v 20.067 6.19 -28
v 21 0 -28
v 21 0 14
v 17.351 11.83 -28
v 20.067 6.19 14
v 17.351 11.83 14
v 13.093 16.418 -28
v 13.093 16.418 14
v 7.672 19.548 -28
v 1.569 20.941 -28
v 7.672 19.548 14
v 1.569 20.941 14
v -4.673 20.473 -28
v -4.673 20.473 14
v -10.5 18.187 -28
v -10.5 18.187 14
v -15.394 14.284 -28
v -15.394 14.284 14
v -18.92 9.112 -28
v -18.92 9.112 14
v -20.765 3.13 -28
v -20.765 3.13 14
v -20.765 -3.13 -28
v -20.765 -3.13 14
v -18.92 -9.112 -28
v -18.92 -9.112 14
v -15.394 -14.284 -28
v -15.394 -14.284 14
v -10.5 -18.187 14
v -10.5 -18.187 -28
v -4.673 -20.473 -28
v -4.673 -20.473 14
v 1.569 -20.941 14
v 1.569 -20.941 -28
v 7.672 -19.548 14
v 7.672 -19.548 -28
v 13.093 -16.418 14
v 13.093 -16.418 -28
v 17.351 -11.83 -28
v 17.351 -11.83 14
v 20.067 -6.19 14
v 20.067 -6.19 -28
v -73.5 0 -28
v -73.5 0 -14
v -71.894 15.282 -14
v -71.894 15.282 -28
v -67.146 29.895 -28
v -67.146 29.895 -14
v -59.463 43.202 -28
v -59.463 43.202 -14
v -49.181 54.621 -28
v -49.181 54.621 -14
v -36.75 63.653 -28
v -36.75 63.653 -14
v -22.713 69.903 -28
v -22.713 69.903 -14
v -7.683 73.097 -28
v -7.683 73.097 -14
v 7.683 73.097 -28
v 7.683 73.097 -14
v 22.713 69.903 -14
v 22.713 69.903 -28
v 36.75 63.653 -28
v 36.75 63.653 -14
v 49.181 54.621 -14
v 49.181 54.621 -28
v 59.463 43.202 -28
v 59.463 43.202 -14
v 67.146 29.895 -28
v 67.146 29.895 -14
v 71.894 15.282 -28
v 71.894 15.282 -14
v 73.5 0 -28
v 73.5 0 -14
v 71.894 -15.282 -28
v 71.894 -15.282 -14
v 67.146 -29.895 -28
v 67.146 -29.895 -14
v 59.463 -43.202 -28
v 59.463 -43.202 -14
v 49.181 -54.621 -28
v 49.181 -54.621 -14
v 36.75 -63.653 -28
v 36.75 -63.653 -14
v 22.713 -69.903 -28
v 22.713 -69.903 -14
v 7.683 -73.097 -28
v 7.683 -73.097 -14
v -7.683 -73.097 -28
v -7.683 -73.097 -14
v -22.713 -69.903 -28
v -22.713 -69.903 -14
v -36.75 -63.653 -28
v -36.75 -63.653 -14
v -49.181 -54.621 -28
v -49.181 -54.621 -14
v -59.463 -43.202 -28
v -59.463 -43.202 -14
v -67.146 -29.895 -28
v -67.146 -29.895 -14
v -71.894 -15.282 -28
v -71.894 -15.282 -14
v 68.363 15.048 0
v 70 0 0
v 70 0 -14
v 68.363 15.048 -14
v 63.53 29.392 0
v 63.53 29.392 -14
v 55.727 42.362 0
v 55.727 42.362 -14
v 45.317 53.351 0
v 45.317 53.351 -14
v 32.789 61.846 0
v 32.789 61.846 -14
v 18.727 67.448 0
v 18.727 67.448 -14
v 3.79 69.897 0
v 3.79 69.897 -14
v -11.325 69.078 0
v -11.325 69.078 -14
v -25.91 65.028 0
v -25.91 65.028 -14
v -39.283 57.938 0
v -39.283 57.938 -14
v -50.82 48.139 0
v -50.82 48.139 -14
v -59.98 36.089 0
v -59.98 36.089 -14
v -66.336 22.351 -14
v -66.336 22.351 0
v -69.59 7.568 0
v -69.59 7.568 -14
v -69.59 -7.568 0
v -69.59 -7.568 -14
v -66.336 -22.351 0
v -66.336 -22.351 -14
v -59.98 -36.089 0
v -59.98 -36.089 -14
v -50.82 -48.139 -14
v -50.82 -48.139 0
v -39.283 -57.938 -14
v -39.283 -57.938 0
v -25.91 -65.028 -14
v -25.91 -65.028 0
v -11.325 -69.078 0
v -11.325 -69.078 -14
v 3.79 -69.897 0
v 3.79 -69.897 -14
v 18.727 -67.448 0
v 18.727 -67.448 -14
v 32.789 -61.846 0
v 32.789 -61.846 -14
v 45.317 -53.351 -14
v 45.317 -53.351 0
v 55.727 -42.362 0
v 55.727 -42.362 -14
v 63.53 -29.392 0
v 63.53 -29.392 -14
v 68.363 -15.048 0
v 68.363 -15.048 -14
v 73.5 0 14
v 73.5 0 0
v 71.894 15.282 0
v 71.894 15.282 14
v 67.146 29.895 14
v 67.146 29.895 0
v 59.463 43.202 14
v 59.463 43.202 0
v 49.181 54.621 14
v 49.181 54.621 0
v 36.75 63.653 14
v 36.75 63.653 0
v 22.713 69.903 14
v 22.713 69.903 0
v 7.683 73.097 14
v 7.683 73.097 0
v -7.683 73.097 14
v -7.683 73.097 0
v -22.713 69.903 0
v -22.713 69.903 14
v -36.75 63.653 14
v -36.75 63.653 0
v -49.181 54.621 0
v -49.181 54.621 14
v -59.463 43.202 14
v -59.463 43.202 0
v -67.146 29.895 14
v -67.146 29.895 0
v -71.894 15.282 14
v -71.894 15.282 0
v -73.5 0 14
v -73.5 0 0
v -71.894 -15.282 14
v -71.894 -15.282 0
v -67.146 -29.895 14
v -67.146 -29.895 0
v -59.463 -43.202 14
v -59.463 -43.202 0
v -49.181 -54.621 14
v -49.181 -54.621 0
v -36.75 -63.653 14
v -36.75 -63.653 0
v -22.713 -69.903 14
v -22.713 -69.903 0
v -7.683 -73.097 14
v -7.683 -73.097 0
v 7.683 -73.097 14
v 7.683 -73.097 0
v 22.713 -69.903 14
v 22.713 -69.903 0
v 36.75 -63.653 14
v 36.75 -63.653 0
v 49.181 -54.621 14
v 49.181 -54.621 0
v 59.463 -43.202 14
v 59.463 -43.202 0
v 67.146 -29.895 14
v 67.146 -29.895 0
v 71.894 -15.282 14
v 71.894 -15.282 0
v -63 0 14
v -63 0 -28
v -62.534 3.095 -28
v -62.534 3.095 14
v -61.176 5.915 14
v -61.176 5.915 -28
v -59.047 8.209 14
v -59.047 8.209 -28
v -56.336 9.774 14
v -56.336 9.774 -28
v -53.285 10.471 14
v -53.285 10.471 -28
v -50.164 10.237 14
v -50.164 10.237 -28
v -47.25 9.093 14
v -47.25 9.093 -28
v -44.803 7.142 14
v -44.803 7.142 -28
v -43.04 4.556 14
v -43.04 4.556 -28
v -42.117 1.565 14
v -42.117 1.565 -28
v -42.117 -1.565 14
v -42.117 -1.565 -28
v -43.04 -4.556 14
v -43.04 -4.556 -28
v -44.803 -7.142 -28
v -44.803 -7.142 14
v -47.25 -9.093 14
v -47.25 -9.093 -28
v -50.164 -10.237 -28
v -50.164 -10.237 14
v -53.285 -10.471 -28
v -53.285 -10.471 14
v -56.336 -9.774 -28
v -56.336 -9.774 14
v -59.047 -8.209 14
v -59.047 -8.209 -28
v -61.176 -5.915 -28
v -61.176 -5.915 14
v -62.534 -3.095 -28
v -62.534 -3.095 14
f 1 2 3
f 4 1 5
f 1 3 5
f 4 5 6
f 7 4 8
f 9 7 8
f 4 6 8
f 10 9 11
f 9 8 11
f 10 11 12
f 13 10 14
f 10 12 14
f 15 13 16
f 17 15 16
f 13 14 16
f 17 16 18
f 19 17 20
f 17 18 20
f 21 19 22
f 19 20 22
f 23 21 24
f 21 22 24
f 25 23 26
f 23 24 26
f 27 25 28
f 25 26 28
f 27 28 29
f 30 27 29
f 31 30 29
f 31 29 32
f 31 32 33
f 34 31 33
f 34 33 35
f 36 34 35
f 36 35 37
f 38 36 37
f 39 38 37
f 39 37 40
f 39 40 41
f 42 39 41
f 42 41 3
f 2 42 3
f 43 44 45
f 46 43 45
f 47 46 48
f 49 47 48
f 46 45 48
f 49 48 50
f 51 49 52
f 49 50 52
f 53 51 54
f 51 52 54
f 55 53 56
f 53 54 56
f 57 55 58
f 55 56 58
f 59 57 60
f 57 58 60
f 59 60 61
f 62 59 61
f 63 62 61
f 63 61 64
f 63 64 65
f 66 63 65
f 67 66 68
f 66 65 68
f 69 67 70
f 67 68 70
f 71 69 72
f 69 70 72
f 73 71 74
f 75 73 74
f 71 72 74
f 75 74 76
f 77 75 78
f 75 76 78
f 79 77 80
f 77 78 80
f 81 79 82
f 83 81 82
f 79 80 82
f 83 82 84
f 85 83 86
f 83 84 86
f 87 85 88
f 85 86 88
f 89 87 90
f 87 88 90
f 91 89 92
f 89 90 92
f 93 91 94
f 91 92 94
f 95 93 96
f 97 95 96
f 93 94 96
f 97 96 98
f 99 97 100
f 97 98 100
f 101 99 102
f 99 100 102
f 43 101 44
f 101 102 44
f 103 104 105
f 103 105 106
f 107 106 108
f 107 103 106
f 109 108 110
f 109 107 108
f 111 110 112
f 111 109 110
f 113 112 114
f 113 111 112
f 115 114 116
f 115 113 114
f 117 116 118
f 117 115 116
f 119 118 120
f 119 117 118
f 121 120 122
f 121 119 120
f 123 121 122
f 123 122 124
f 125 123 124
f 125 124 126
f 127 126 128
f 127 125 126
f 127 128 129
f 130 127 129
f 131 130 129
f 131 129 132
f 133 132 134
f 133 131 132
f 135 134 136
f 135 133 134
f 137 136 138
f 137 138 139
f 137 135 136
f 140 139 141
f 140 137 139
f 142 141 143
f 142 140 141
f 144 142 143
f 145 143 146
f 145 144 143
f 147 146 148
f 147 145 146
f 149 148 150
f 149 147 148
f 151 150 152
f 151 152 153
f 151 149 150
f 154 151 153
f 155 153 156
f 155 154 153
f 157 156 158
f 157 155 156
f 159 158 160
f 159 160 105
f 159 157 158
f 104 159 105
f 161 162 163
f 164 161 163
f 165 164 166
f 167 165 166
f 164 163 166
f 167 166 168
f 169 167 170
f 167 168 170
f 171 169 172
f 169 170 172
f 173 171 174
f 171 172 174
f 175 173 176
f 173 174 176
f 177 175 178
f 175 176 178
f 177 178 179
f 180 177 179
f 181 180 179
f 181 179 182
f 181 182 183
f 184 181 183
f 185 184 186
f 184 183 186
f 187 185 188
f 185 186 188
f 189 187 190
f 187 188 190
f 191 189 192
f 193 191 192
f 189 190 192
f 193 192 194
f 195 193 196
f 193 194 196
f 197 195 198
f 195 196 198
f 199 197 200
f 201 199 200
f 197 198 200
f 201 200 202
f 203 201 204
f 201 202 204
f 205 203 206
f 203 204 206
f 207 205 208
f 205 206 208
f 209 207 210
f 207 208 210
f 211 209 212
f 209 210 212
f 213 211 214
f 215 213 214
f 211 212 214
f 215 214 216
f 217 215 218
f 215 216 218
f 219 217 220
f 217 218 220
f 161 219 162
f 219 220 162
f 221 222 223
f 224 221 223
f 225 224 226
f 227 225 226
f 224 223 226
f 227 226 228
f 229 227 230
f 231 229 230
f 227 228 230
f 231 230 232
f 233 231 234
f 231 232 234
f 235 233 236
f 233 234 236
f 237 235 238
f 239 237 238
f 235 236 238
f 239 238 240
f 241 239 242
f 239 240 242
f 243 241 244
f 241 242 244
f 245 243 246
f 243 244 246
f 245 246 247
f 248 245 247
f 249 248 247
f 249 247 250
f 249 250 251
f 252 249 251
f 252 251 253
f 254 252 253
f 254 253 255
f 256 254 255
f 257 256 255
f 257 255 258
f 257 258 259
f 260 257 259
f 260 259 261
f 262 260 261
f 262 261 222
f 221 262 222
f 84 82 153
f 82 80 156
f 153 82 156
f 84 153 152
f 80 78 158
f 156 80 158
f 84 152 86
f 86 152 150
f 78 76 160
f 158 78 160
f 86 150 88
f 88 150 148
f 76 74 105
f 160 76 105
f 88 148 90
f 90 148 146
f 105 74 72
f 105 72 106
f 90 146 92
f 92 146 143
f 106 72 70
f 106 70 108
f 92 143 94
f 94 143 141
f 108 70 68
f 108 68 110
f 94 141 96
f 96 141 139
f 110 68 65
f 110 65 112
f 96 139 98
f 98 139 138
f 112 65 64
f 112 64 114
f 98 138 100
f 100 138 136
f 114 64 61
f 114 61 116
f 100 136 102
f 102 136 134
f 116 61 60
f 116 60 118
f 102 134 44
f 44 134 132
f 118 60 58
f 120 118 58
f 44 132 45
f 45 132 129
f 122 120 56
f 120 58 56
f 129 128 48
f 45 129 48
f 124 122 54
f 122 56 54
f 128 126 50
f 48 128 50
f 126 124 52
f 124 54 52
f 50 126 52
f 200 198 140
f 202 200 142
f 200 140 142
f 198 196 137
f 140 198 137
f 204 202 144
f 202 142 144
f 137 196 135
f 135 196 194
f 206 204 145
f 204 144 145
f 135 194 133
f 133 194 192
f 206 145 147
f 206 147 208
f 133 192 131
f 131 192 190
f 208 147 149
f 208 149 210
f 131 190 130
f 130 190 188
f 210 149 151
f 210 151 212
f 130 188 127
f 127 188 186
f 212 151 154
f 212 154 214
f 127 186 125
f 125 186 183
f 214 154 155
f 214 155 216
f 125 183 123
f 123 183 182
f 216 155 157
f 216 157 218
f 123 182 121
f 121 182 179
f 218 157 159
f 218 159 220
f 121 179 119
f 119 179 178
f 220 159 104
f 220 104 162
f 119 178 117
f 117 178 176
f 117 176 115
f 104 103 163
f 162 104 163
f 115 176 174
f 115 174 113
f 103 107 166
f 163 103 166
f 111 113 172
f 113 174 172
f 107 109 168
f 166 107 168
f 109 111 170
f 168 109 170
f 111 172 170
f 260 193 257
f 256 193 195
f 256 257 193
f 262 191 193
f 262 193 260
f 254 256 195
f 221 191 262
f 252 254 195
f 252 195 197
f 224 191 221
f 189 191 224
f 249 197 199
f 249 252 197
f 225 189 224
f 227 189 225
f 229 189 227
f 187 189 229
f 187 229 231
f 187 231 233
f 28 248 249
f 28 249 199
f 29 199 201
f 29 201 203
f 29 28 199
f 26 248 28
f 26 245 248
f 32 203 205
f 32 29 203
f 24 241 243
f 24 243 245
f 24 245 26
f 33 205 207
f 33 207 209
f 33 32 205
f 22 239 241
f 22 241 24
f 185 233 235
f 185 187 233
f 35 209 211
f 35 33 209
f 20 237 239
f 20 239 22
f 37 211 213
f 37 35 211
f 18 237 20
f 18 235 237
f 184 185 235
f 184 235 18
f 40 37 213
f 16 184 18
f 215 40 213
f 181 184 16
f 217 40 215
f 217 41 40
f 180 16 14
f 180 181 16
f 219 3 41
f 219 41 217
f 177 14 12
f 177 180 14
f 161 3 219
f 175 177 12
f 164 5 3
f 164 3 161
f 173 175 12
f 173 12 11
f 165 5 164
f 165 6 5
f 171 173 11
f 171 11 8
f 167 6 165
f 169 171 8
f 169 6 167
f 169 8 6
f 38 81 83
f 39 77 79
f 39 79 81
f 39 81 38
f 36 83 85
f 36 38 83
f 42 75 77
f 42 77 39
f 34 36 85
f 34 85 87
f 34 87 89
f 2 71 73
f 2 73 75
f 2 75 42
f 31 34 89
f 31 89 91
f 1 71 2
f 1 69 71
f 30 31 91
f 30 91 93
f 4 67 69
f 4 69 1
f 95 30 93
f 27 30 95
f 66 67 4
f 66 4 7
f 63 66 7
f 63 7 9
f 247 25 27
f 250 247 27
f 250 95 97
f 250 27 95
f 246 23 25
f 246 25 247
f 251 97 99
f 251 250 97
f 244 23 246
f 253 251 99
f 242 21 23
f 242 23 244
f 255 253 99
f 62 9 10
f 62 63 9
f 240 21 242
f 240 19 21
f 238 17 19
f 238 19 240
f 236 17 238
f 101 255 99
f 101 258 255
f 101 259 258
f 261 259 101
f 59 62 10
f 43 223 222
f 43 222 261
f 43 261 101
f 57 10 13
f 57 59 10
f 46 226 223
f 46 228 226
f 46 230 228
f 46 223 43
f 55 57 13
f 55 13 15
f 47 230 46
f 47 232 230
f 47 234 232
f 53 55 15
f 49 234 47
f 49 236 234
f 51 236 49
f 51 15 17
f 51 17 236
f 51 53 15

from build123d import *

# Parameters (mm, degrees)
CROQUIS2_R              = 73.5
SALIENTE_EXTRUIR1_DEPTH = 14
CROQUIS6_R              = 70
SALIENTE_EXTRUIR4_DEPTH = 14
CROQUIS8_R              = 73.5
SALIENTE_EXTRUIR5_DEPTH = 14
CROQUIS10_R             = 21
CORTAR_EXTRUIR2_DEPTH   = 84
CROQUIS11_R             = 10.5
CORTAR_EXTRUIR3_DEPTH   = 84


with BuildPart() as part:
    # Croquis2 → Saliente-Extruir1 (new body)
    with BuildSketch(Plane.XY):
        Circle(CROQUIS2_R)
    extrude(amount=SALIENTE_EXTRUIR1_DEPTH)

    # Croquis6 → Saliente-Extruir4 (add)
    with BuildSketch(Plane.XY):
        Circle(CROQUIS6_R)
    extrude(amount=-SALIENTE_EXTRUIR4_DEPTH)

    # Croquis8 → Saliente-Extruir5 (add)
    with BuildSketch(Plane(origin=(0, 0, -14), x_dir=(-1, 0, 0), z_dir=(0, 0, -1))):
        Circle(CROQUIS8_R)
    extrude(amount=SALIENTE_EXTRUIR5_DEPTH)

    # Croquis10 → Cortar-Extruir2 (cut)
    with BuildSketch(Plane.XY.offset(14)):
        Circle(CROQUIS10_R)
    extrude(amount=-CORTAR_EXTRUIR2_DEPTH, mode=Mode.SUBTRACT)

    # Croquis11 → Cortar-Extruir3 (cut)
    with BuildSketch(Plane(origin=(0, 0, -28), x_dir=(-1, 0, 0), z_dir=(0, 0, -1))):
        with Locations((52.5, 0)):
            Circle(CROQUIS11_R)
    extrude(amount=-CORTAR_EXTRUIR3_DEPTH, mode=Mode.SUBTRACT)


solid = part.part
